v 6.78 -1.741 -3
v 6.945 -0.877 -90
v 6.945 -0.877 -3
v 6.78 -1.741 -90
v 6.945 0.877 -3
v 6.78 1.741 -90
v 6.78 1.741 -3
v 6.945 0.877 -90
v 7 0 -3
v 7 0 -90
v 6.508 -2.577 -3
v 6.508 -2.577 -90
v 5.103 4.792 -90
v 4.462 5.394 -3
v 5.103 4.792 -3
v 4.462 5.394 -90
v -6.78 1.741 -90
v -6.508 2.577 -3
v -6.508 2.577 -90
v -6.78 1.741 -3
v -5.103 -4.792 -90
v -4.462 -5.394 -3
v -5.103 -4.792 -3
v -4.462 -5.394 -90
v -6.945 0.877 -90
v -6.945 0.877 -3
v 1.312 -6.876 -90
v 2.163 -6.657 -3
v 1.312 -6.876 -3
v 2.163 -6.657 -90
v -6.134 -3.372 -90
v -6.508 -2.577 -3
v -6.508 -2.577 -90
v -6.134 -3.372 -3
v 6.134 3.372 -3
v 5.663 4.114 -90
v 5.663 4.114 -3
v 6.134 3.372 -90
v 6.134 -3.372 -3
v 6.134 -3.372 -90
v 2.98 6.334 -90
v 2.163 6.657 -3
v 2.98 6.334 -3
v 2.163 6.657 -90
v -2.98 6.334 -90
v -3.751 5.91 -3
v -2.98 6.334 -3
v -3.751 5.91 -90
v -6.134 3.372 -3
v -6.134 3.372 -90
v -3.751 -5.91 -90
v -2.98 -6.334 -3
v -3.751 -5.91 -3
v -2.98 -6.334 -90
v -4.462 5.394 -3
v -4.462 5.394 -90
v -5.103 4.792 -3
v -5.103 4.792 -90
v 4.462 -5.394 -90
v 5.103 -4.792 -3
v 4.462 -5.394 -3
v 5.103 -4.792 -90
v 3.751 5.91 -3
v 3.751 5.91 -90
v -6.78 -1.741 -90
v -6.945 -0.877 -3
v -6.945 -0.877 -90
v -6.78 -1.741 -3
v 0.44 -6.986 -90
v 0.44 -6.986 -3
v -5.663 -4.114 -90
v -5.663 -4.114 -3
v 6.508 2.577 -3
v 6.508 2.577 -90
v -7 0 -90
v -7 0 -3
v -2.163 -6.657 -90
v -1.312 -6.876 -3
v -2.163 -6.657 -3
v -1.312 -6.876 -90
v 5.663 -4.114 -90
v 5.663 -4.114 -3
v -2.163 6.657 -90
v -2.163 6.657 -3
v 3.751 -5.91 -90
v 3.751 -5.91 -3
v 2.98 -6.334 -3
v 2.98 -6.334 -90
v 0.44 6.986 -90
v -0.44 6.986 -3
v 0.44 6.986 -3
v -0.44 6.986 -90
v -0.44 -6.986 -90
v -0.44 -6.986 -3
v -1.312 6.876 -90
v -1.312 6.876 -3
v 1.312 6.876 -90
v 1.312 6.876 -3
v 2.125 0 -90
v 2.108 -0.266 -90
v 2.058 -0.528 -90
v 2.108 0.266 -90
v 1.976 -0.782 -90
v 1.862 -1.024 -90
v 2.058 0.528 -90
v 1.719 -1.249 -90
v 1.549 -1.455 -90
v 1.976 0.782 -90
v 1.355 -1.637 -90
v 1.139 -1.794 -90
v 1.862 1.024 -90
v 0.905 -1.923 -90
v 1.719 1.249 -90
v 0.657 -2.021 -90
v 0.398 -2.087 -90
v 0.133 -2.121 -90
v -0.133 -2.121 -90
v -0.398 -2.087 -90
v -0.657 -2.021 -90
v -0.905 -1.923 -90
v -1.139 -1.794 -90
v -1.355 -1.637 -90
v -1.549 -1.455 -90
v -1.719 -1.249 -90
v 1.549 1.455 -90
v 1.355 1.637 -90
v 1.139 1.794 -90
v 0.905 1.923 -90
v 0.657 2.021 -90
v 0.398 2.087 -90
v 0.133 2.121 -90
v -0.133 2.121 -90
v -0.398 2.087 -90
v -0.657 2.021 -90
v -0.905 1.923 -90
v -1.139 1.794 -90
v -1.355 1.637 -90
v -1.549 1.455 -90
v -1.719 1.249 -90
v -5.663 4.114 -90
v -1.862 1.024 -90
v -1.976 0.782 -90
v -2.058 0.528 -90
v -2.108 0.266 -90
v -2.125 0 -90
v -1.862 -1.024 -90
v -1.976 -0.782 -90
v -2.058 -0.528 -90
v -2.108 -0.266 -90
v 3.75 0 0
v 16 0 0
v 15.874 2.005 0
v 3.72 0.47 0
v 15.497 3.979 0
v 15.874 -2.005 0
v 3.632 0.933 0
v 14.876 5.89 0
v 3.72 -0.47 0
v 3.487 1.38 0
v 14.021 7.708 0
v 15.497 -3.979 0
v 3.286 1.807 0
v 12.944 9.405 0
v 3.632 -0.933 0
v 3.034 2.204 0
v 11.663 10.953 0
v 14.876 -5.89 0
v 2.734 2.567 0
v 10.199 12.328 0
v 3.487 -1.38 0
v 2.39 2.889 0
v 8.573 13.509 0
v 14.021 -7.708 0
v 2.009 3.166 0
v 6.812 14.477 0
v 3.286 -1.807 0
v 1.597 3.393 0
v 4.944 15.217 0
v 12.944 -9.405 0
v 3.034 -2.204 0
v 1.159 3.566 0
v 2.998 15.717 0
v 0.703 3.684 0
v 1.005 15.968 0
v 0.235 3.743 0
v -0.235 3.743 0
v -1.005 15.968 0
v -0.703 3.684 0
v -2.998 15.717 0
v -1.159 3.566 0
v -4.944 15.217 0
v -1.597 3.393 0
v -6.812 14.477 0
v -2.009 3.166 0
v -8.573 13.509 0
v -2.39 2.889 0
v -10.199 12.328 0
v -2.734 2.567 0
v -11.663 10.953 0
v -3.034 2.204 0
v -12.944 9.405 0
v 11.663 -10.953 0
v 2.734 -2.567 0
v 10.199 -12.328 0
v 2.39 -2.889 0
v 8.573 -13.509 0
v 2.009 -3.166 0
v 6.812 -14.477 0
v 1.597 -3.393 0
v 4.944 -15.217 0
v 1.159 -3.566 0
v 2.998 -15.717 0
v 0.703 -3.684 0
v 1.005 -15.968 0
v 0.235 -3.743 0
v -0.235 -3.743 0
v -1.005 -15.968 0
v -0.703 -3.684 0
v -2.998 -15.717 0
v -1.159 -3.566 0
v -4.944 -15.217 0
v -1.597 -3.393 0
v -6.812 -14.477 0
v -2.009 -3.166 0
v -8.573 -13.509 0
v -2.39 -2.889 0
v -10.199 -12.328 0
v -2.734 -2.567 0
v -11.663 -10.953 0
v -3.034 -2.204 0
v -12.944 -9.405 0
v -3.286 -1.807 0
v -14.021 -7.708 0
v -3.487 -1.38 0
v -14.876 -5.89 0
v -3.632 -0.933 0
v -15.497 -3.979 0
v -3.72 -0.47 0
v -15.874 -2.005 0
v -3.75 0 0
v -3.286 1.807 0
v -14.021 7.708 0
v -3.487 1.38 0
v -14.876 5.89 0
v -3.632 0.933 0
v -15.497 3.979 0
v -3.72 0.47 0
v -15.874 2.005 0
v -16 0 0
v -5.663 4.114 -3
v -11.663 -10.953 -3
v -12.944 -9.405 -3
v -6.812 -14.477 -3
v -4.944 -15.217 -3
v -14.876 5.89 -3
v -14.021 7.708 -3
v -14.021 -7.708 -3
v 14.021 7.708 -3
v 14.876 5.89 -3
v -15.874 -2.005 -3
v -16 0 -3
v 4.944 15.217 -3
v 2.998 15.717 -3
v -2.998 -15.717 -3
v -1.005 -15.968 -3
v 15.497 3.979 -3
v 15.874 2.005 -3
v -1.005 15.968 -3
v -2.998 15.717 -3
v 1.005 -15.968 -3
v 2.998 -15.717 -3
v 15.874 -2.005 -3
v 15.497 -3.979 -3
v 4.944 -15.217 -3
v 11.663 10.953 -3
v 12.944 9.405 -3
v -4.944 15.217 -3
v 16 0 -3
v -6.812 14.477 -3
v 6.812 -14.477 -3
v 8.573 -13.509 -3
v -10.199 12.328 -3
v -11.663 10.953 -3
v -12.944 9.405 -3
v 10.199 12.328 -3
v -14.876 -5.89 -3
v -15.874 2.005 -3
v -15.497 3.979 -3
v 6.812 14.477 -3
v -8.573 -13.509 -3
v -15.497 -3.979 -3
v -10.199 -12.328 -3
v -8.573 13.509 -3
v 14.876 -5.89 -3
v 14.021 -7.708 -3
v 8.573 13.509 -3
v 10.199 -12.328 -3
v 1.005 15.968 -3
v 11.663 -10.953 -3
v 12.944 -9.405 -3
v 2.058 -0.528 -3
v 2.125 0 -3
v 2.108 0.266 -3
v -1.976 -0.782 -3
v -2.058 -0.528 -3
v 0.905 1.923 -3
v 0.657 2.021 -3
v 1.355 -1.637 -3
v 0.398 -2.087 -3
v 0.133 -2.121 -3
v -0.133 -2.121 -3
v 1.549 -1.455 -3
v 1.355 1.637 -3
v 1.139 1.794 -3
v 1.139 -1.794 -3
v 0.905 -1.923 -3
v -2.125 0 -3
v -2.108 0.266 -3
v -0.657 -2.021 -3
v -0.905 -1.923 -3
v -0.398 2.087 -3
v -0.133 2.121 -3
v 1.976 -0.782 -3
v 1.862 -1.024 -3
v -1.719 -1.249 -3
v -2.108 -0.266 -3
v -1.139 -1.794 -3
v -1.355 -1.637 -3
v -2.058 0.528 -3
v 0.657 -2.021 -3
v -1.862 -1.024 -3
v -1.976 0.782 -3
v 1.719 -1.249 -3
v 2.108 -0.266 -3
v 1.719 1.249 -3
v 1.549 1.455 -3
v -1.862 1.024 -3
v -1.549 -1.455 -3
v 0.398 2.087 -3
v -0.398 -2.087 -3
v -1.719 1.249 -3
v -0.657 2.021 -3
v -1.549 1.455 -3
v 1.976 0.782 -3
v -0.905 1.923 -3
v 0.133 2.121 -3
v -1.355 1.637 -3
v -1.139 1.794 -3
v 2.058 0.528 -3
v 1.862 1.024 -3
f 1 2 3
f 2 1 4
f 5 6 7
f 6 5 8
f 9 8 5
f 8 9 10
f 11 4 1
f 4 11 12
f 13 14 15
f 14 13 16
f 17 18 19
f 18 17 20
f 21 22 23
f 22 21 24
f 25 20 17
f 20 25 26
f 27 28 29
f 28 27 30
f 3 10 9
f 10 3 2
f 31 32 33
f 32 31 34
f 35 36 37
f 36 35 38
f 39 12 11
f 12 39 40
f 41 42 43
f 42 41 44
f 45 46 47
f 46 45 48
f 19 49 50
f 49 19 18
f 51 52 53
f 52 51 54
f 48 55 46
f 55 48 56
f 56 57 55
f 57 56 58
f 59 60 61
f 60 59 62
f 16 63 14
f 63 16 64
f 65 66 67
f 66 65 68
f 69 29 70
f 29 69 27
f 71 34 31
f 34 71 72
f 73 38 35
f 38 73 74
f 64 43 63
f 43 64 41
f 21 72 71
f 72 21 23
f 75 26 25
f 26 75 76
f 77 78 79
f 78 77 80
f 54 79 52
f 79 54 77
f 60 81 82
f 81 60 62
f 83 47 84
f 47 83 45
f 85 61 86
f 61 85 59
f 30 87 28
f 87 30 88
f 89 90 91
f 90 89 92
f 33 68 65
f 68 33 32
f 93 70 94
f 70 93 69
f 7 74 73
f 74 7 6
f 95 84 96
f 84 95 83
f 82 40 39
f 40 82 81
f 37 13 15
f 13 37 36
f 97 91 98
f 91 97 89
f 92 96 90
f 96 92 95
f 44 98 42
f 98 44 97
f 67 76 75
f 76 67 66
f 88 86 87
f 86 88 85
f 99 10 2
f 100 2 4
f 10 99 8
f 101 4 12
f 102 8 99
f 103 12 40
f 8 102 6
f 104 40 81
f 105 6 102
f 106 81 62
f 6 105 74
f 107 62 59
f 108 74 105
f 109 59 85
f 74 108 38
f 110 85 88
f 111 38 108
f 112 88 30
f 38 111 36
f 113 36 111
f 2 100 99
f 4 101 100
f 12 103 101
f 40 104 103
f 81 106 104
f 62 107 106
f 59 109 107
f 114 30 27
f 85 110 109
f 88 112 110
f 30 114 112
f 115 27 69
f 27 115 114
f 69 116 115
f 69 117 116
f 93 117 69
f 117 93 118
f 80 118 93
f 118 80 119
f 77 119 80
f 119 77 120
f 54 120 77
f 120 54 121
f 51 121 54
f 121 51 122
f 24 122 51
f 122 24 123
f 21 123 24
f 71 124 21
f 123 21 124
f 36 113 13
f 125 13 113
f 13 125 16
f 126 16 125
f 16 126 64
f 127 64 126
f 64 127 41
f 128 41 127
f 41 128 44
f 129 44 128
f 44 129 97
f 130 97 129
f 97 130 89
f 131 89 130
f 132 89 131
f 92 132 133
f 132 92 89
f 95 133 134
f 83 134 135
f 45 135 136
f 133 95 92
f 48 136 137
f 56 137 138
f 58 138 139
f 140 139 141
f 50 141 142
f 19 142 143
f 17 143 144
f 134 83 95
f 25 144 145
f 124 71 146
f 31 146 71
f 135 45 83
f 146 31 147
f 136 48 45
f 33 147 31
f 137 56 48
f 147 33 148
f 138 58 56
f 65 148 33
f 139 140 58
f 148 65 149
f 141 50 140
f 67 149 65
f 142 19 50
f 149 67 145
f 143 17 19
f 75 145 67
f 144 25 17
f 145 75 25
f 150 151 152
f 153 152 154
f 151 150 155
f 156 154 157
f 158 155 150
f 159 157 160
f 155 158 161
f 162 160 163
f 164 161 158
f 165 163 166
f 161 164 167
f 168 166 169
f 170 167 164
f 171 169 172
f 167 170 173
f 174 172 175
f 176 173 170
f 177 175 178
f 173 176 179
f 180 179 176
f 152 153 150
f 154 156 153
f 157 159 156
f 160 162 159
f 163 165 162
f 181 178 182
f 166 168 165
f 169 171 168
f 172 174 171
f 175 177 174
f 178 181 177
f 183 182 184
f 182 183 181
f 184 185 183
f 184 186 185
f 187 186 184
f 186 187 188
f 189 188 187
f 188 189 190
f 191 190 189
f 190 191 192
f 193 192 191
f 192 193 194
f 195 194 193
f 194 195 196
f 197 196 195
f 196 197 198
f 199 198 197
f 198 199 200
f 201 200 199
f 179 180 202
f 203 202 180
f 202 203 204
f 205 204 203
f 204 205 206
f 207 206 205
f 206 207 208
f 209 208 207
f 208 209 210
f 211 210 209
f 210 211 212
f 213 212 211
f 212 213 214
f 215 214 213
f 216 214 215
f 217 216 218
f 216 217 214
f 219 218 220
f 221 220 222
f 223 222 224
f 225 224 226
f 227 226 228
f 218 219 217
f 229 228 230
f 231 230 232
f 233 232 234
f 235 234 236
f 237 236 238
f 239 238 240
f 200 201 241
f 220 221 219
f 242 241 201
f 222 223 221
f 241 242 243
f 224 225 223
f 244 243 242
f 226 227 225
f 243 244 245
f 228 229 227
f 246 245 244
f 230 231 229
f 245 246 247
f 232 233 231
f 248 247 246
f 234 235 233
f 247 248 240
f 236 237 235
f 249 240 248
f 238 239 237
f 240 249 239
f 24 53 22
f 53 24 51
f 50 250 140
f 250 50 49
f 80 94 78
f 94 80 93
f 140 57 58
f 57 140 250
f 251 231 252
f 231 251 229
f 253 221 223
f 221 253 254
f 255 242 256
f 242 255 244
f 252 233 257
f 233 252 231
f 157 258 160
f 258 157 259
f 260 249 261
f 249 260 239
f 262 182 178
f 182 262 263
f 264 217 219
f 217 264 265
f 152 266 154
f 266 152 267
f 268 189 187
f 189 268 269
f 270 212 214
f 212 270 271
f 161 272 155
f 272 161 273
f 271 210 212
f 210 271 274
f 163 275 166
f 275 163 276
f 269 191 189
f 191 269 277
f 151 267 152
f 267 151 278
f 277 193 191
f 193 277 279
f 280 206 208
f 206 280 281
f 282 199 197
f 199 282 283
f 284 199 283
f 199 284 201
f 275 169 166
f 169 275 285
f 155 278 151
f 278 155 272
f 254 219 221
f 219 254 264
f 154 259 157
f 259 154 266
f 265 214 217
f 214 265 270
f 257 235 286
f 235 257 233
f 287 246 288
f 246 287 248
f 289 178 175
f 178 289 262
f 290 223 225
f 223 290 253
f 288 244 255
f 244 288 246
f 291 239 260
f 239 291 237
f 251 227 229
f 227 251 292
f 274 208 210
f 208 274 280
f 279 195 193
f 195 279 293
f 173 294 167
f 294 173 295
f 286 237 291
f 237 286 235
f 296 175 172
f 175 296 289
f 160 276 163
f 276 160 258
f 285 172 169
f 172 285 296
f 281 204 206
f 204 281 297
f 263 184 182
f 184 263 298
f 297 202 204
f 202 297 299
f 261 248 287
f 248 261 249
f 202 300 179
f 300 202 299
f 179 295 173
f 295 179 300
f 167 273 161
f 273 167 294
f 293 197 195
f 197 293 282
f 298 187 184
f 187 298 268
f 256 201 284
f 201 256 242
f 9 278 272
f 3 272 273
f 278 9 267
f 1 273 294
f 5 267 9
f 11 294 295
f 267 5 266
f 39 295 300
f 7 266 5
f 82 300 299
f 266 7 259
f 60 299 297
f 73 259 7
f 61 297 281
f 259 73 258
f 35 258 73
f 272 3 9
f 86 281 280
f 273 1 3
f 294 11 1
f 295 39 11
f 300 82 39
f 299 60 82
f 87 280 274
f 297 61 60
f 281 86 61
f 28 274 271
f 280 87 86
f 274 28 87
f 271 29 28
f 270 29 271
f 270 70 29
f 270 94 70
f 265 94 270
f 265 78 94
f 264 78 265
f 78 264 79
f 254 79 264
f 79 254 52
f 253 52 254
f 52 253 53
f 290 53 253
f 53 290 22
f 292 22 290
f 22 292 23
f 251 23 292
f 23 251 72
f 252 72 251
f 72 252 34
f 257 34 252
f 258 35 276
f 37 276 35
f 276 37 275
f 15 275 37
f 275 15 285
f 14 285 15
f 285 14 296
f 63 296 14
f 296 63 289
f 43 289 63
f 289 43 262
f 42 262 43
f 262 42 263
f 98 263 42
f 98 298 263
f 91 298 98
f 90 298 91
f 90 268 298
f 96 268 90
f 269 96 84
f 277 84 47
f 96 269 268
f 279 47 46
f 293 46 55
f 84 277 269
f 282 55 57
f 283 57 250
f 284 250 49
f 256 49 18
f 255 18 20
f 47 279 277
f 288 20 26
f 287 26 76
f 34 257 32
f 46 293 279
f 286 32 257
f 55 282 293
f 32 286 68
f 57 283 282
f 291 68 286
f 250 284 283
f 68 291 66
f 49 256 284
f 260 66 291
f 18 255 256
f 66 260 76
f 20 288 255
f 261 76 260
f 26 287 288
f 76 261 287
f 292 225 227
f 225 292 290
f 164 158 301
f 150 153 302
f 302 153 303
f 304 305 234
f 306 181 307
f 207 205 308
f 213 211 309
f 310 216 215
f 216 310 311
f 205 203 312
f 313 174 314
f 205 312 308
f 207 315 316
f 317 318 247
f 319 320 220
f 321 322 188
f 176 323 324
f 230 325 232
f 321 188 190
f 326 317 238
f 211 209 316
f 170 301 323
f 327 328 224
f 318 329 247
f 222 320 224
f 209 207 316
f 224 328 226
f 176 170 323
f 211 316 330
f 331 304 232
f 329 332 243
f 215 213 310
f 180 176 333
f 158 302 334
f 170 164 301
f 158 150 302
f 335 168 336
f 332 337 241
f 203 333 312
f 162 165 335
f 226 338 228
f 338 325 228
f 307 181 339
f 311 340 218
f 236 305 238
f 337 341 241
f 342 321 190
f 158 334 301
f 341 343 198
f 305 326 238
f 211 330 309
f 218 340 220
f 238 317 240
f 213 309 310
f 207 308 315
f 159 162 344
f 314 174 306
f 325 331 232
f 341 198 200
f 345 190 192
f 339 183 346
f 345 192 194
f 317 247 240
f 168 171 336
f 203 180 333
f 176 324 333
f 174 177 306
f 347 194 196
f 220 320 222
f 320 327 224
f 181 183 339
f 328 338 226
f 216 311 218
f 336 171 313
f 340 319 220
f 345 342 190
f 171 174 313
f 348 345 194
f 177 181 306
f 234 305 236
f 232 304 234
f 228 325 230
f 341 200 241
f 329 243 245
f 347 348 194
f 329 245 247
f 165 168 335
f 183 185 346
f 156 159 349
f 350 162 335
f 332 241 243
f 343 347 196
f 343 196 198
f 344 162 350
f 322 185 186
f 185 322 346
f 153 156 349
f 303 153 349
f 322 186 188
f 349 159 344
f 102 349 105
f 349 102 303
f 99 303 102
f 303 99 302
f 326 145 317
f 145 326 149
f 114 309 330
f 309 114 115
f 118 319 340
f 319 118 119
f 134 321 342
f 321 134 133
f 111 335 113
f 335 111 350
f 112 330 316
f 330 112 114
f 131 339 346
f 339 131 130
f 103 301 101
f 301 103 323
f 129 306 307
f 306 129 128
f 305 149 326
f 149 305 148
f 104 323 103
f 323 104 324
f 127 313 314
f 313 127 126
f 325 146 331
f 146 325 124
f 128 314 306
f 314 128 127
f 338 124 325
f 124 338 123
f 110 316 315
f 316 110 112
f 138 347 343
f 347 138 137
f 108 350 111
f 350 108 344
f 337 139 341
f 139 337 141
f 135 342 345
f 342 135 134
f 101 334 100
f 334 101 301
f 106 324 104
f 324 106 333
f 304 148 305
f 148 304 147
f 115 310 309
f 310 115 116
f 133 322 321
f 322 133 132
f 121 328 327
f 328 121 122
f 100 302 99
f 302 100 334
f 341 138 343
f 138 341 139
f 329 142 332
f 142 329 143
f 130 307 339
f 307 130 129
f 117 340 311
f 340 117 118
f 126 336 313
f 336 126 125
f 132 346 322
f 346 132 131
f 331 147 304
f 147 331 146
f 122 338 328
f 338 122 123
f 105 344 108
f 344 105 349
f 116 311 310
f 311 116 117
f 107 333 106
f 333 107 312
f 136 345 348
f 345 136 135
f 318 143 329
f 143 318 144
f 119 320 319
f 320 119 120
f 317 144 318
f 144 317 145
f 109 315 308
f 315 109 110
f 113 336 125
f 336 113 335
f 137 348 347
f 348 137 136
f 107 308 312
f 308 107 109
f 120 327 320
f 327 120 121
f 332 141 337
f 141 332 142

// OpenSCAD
$fn = 50;


difference() {
	union() {
		translate(v = [0, 0, -90.0000000000]) {
			cylinder(h = 90, r = 7.0000000000);
		}
		translate(v = [0, 0, -3.0000000000]) {
			cylinder(h = 3, r = 16.0000000000);
		}
	}
	union() {
		translate(v = [0, 0, 0]) {
			rotate(a = [0, 0, 0]) {
				difference() {
					union() {
						#translate(v = [0, 0, -90.0000000000]) {
							cylinder(h = 90, r = 2.0000000000);
						}
						#translate(v = [0, 0, -3]) {
							cylinder(h = 3, r = 7.0000000000, r1 = 2.1250000000, r2 = 3.7500000000);
						}
						#translate(v = [0, 0, -90.0000000000]) {
							cylinder(h = 90, r = 2.1250000000);
						}
						#translate(v = [0, 0, -90.0000000000]) {
							cylinder(h = 90, r = 2.0000000000);
						}
					}
					union();
				}
			}
		}
	}
}
